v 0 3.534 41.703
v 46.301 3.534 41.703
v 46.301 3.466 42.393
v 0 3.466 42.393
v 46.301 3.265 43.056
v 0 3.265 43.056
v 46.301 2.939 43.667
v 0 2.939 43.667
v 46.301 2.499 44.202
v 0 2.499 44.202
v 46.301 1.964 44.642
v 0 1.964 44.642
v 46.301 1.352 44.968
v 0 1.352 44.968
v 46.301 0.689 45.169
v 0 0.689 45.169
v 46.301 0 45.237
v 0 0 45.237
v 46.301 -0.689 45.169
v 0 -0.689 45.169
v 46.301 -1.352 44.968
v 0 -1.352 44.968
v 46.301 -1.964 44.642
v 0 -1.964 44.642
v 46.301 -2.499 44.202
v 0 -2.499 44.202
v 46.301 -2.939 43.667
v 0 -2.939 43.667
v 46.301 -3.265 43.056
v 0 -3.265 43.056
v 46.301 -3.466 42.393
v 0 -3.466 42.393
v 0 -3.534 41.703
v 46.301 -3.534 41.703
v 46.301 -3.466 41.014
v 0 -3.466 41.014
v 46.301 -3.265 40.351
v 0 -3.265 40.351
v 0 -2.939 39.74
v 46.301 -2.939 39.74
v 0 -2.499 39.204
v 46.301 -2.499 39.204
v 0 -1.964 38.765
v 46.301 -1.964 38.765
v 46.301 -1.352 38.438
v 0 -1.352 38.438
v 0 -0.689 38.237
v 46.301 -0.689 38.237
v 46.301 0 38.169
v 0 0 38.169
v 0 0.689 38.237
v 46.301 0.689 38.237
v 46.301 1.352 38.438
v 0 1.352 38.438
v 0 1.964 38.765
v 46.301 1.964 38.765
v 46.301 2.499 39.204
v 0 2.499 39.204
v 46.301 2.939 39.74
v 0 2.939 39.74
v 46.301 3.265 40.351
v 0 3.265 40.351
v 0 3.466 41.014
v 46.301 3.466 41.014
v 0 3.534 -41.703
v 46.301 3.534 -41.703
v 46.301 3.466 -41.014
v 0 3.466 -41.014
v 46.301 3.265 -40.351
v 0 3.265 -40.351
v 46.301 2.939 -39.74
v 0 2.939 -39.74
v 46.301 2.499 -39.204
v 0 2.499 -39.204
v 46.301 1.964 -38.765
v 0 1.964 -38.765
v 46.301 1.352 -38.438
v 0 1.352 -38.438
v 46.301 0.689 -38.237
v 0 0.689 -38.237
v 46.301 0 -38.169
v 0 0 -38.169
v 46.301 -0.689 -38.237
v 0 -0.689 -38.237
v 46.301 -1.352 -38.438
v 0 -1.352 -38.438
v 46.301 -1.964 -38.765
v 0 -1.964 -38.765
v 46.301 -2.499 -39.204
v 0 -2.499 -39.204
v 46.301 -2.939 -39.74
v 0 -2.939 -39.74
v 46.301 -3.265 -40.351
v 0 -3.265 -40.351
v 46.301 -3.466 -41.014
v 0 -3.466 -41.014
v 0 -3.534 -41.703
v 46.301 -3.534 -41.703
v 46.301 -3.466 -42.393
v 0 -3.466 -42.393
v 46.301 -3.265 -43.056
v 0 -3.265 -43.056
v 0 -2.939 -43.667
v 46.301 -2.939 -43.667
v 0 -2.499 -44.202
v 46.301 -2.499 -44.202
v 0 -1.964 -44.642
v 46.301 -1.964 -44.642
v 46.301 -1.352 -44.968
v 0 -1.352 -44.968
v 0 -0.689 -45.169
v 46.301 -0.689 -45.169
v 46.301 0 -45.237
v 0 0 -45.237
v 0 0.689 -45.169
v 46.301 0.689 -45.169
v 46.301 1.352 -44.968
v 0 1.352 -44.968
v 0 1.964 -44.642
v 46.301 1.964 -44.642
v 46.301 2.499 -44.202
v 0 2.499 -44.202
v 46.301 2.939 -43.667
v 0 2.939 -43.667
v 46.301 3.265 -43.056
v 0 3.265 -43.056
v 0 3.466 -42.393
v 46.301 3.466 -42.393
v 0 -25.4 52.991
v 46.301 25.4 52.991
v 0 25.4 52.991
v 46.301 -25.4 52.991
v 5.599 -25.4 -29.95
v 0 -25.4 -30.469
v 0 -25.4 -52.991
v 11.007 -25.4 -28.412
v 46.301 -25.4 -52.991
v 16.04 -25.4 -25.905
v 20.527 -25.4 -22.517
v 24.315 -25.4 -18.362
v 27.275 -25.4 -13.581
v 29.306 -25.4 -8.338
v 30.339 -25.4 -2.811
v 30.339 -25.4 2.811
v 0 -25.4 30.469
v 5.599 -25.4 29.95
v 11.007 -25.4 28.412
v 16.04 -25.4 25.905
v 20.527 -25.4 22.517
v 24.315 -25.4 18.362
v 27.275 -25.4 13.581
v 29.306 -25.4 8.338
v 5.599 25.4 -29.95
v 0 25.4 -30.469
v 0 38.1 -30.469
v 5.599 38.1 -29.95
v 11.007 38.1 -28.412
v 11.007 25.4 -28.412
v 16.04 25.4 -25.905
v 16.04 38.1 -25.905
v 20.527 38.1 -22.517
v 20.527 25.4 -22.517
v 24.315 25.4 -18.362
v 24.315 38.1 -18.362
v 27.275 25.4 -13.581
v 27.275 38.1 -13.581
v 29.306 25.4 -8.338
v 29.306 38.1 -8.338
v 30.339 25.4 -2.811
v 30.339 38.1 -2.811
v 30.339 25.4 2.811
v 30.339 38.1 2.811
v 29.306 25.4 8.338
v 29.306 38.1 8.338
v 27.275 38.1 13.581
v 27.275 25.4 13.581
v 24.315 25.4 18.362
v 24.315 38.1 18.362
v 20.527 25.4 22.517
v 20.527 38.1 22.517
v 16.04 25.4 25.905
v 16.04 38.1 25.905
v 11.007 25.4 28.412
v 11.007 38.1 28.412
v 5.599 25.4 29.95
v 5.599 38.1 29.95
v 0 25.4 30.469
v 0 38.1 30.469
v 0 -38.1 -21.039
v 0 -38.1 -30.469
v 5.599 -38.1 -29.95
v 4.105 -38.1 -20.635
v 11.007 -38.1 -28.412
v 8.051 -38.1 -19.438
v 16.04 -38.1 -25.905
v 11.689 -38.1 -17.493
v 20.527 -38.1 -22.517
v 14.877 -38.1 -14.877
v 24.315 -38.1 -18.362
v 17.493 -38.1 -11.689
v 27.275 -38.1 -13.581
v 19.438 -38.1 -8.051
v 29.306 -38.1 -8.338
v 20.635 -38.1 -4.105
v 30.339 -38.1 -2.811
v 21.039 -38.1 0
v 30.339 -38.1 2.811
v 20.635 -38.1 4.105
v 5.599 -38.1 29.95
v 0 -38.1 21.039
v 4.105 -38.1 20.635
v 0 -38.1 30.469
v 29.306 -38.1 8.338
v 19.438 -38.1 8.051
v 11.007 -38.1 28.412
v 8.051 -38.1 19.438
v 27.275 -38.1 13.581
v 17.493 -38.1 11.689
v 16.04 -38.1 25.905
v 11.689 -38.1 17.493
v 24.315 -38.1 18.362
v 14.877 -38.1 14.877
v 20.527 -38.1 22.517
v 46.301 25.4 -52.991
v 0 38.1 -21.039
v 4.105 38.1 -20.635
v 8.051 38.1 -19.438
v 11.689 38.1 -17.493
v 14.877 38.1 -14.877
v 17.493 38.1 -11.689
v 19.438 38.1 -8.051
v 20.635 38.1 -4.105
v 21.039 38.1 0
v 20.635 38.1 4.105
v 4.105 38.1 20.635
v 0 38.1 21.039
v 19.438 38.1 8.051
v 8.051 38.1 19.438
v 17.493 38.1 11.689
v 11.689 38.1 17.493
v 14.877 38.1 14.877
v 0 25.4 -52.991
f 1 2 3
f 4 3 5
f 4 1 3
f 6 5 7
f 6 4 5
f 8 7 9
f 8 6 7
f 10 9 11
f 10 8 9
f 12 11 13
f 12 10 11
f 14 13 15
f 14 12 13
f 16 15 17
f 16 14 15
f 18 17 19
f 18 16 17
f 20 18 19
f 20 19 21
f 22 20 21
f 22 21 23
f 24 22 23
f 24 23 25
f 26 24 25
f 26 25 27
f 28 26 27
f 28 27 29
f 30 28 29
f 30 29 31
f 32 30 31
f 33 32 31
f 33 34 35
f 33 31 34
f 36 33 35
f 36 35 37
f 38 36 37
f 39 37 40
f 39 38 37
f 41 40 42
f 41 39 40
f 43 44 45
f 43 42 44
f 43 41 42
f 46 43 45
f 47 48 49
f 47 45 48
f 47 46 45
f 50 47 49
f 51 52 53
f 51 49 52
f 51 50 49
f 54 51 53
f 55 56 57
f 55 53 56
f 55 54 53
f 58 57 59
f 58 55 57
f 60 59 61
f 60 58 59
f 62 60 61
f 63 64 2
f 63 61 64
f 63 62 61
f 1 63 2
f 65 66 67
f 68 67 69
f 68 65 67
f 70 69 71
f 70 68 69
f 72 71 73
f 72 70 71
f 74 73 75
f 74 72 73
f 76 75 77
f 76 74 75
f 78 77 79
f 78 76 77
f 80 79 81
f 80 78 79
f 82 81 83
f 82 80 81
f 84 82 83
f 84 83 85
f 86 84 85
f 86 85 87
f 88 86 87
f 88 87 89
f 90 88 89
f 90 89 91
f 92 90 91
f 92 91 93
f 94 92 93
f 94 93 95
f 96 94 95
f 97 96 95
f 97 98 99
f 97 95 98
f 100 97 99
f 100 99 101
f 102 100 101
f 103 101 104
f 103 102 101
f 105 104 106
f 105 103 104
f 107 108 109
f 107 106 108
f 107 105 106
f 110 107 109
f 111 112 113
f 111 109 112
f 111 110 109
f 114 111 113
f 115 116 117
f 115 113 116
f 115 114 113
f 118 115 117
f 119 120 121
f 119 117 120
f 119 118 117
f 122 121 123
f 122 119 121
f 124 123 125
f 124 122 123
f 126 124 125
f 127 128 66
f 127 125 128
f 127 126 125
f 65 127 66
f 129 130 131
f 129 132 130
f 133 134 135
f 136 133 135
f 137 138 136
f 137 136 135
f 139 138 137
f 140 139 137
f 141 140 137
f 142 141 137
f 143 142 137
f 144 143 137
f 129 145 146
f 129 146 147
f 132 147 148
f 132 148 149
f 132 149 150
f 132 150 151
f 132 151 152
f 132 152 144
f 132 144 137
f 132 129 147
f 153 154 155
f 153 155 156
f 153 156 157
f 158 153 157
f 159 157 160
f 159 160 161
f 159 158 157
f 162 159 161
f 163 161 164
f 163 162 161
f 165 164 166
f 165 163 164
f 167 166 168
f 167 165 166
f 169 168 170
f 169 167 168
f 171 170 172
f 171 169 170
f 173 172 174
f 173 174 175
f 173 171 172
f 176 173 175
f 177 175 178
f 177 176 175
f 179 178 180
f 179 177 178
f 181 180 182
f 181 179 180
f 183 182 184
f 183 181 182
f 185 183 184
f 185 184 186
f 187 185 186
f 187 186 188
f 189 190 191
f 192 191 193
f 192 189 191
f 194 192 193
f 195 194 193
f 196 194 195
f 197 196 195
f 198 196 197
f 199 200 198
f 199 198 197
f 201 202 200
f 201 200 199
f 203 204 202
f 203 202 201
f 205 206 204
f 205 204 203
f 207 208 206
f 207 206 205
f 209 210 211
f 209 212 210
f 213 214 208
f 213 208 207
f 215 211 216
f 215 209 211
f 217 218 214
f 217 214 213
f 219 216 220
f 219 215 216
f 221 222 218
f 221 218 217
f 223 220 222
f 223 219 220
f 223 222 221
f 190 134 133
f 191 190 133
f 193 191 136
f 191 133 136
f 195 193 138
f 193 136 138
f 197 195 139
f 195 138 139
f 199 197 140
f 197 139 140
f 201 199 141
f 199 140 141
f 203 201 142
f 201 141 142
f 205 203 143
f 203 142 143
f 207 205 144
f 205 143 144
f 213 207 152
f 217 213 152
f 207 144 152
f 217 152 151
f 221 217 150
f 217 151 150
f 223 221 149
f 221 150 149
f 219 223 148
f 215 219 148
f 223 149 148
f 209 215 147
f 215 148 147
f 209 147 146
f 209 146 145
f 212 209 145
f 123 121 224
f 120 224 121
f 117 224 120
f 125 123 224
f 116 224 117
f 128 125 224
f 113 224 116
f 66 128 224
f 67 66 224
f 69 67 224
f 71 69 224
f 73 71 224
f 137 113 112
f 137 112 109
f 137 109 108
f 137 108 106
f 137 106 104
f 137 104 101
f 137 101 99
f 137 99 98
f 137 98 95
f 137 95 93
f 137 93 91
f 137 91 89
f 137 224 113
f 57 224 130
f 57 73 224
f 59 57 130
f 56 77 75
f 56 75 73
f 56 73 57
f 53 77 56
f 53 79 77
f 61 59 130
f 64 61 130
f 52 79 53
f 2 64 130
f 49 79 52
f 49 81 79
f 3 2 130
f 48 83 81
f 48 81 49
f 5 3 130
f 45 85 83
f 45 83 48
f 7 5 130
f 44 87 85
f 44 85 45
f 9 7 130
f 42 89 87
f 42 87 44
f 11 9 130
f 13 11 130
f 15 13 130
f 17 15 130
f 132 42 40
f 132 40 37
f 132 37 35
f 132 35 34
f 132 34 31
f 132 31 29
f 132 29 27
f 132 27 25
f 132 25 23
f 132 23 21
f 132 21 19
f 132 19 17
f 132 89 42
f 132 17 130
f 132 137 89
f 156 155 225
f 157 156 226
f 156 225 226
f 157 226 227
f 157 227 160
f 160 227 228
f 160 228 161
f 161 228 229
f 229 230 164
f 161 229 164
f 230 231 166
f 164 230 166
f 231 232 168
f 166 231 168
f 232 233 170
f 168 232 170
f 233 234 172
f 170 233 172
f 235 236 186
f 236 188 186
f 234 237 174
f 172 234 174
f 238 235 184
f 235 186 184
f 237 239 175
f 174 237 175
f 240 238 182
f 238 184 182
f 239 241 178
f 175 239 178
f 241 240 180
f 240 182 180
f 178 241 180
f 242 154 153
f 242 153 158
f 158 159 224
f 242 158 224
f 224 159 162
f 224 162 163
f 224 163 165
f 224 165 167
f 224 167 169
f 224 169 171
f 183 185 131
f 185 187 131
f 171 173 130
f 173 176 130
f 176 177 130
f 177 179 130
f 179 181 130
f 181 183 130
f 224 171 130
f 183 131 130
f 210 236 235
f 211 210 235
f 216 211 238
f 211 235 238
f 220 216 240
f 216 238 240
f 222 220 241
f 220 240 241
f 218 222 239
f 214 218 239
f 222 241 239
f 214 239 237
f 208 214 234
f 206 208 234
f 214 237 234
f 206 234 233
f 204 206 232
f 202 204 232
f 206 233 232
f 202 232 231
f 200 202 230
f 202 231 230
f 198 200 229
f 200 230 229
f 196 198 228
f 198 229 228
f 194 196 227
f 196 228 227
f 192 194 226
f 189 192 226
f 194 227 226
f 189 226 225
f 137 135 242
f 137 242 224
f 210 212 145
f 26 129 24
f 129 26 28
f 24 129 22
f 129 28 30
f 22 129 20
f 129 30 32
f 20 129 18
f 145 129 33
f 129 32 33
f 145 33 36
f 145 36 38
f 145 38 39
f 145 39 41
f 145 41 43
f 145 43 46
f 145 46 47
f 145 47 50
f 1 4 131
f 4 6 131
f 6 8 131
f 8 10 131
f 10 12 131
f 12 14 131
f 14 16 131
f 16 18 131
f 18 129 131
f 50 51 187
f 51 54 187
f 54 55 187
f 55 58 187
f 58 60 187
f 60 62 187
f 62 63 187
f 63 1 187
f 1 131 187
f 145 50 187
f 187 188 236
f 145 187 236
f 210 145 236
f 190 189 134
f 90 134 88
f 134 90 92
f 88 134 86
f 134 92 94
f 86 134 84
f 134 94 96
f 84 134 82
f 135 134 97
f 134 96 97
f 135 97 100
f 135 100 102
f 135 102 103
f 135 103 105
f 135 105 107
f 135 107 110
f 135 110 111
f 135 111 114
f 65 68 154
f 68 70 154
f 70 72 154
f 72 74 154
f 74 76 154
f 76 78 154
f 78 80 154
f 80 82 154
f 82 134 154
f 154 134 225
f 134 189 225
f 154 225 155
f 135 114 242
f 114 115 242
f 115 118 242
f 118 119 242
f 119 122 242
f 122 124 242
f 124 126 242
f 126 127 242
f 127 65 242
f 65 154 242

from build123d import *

# Parameters (mm, degrees)
F1_DEPTH      = 25.4
F1_DEPTH_BACK = 25.4
F2_DEPTH      = 38.1
F2_DEPTH_BACK = 38.1
F3_R          = 3.534221
F4_DEPTH      = 46.301903


with BuildPart() as f1:
    # F0 (on Front) → F1 (new body, two sides)
    with BuildSketch(Plane.XZ) as f1_sk:
        with BuildLine():
            ThreePointArc((0, 21.039158), (21.039158, 0), (0, -21.039158))
            Line((0, -21.039158), (0, -30.469209))
            ThreePointArc((0, -30.469209), (30.469209, 0), (0, 30.469209))
            Line((0, 30.469209), (0, 21.039158))
        make_face()
        with BuildLine():
            ThreePointArc((0, 30.469209), (30.469209, 0), (0, -30.469209))
            Line((0, -30.469209), (0, -52.990768))
            Line((0, -52.990768), (46.300903, -52.990768))
            Line((46.300903, -52.990768), (46.300903, 0))
            Line((46.300903, 0), (46.300903, 52.990768))
            Line((46.300903, 52.990768), (0, 52.990768))
            Line((0, 52.990768), (0, 30.469209))
        make_face()
    extrude(amount=F1_DEPTH)
    extrude(f1_sk.sketch, amount=-F1_DEPTH_BACK)

    # F0 (on Front) → F2 (join, two sides)
    with BuildSketch(Plane.XZ) as f2_sk:
        with BuildLine():
            ThreePointArc((0, 21.039158), (21.039158, 0), (0, -21.039158))
            Line((0, -21.039158), (0, -30.469209))
            ThreePointArc((0, -30.469209), (30.469209, 0), (0, 30.469209))
            Line((0, 30.469209), (0, 21.039158))
        make_face()
    extrude(amount=F2_DEPTH)
    extrude(f2_sk.sketch, amount=-F2_DEPTH_BACK)

    # F3 (on Right) → F4 (cut, through all)
    with BuildSketch(Plane.YZ):
        with Locations((0, -41.703153)):
            Circle(F3_R)
        with Locations((0, 41.703153)):
            Circle(F3_R)
    extrude(amount=F4_DEPTH, mode=Mode.SUBTRACT)


solid = f1.part
